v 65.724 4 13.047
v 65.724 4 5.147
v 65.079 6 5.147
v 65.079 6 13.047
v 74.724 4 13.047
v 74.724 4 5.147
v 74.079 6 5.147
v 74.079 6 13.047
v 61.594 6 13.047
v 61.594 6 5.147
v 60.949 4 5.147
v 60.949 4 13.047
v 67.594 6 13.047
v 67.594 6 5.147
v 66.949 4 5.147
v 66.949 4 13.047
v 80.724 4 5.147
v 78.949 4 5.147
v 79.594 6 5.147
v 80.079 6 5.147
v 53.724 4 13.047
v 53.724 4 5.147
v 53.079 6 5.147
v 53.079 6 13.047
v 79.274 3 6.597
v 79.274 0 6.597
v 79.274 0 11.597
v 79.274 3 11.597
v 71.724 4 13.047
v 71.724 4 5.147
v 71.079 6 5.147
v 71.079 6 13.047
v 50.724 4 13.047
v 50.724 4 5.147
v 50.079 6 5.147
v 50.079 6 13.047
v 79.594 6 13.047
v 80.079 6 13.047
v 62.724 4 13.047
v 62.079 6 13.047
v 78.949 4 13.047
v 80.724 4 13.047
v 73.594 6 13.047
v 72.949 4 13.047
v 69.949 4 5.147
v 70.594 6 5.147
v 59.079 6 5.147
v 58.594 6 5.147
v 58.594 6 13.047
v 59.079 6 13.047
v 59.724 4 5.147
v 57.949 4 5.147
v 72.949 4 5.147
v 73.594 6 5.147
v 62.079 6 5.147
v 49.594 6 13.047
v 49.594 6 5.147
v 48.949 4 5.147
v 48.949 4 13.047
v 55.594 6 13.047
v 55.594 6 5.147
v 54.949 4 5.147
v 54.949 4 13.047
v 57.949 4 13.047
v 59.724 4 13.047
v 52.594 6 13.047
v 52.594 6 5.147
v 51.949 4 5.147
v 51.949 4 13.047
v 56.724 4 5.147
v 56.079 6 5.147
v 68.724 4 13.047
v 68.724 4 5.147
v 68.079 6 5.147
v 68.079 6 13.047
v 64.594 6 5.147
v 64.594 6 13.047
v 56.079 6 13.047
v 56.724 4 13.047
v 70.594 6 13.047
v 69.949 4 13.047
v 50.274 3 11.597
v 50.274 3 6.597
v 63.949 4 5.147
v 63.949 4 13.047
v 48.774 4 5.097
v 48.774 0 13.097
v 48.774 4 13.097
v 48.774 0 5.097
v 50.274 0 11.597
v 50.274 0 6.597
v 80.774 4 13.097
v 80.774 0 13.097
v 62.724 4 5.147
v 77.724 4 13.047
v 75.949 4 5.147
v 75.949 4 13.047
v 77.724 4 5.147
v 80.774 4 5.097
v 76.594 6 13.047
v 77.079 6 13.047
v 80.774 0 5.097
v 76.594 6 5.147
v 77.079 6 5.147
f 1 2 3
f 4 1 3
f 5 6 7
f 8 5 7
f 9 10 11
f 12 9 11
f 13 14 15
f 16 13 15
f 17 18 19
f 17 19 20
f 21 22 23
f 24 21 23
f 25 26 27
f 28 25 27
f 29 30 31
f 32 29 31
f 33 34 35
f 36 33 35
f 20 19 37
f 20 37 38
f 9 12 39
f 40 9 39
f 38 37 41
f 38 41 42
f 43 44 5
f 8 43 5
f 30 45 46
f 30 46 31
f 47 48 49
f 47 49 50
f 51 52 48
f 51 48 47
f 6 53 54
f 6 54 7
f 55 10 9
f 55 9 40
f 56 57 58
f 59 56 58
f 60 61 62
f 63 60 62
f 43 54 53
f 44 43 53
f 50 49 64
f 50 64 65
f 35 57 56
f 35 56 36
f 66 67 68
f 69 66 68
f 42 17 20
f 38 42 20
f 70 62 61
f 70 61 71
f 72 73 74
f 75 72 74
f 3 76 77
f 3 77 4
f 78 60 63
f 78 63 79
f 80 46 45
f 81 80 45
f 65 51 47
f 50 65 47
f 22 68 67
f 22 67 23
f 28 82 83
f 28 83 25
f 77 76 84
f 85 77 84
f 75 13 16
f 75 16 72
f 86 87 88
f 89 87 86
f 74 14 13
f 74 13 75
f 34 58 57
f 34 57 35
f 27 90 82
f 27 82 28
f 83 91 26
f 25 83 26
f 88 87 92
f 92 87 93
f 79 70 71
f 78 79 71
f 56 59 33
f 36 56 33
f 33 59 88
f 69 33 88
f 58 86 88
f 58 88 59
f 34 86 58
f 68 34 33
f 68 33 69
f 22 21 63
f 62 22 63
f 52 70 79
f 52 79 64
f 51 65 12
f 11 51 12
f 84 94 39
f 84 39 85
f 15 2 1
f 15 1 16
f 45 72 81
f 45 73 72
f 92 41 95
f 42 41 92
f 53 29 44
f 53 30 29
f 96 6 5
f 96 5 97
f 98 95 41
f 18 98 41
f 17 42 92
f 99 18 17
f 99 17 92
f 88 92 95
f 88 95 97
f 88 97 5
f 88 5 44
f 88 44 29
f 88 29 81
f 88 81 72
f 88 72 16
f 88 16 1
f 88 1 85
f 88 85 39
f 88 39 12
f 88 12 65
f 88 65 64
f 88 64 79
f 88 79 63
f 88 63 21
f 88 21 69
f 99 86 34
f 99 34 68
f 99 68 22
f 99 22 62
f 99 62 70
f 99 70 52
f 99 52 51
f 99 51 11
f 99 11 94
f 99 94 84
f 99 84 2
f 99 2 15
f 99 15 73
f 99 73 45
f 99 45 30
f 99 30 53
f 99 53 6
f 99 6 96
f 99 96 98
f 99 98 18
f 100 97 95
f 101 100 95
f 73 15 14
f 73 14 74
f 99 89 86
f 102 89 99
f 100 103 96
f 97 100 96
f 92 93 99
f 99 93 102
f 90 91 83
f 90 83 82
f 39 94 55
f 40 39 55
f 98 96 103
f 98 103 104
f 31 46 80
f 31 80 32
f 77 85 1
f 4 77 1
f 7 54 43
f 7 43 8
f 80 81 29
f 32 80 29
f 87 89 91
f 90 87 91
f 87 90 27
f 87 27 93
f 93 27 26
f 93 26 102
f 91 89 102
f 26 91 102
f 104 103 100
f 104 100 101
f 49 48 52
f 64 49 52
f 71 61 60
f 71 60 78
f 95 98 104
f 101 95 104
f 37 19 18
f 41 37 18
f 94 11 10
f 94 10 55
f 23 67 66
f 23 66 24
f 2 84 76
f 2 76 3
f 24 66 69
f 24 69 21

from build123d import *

# Parameters (mm, degrees)
SKETCH1_W           = 32
SKETCH1_H           = 8
BOSS_EXTRUDE1_DEPTH = 4
SKETCH2_W           = 31.9
SKETCH2_H           = 7.9
BOSS_EXTRUDE2_DEPTH = 2
SKETCH4_W           = 29
SKETCH4_H           = 5
CUT_EXTRUDE2_DEPTH  = 3
CUT_EXTRUDE3_DEPTH  = 10


with BuildPart() as part:
    # Sketch1 → Boss-Extrude1 (new body)
    with BuildSketch(Plane(origin=(0, 0, 0), x_dir=(1, 0, 0), z_dir=(0, 1, 0))):
        with Locations((64.774193548, -9.096774194)):
            Rectangle(SKETCH1_W, SKETCH1_H)
    extrude(amount=BOSS_EXTRUDE1_DEPTH)

    # Sketch2 → Boss-Extrude2 (add)
    with BuildSketch(Plane(origin=(0, 4, 0), x_dir=(1, 0, 0), z_dir=(0, 1, 0))):
        with Locations((64.774193548, -9.096774194)):
            Rectangle(SKETCH2_W, SKETCH2_H)
    extrude(amount=BOSS_EXTRUDE2_DEPTH)

    # Sketch4 → Cut-Extrude2 (cut)
    with BuildSketch(Plane.XZ):
        with Locations((64.774193548, 9.096774194)):
            Rectangle(SKETCH4_W, SKETCH4_H)
    extrude(amount=-CUT_EXTRUDE2_DEPTH, mode=Mode.SUBTRACT)

    # Sketch3 → Cut-Extrude3 (cut)
    with BuildSketch(Plane(origin=(0, 0, 5.146774194), x_dir=(-1, 0, 0), z_dir=(0, 0, -1))):
        Polygon((-77.724193548, 4), (-77.079193548, 6), (-79.594193548, 6), (-78.949193548, 4), align=None)
        Polygon((-82.594193548, 6), (-81.949193548, 4), (-80.724193548, 4), (-80.079193548, 6), align=None)
        Polygon((-74.724193548, 4), (-74.079193548, 6), (-76.594193548, 6), (-75.949193548, 4), align=None)
        Polygon((-71.724193548, 4), (-71.079193548, 6), (-73.594193548, 6), (-72.949193548, 4), align=None)
        Polygon((-68.724193548, 4), (-68.079193548, 6), (-70.594193548, 6), (-69.949193548, 4), align=None)
        Polygon((-65.724193548, 4), (-65.079193548, 6), (-67.594193548, 6), (-66.949193548, 4), align=None)
        Polygon((-62.724193548, 4), (-62.079193548, 6), (-64.594193548, 6), (-63.949193548, 4), align=None)
        Polygon((-59.724193548, 4), (-59.079193548, 6), (-61.594193548, 6), (-60.949193548, 4), align=None)
        Polygon((-56.724193548, 4), (-56.079193548, 6), (-58.594193548, 6), (-57.949193548, 4), align=None)
        Polygon((-53.724193548, 4), (-53.079193548, 6), (-55.594193548, 6), (-54.949193548, 4), align=None)
        Polygon((-50.724193548, 4), (-50.079193548, 6), (-52.594193548, 6), (-51.949193548, 4), align=None)
        Polygon((-47.724193548, 4), (-47.079193548, 6), (-49.594193548, 6), (-48.949193548, 4), align=None)
        Polygon((-44.724193548, 4), (-44.079193548, 6), (-46.594193548, 6), (-45.949193548, 4), align=None)
    extrude(amount=-CUT_EXTRUDE3_DEPTH, mode=Mode.SUBTRACT)


solid = part.part
